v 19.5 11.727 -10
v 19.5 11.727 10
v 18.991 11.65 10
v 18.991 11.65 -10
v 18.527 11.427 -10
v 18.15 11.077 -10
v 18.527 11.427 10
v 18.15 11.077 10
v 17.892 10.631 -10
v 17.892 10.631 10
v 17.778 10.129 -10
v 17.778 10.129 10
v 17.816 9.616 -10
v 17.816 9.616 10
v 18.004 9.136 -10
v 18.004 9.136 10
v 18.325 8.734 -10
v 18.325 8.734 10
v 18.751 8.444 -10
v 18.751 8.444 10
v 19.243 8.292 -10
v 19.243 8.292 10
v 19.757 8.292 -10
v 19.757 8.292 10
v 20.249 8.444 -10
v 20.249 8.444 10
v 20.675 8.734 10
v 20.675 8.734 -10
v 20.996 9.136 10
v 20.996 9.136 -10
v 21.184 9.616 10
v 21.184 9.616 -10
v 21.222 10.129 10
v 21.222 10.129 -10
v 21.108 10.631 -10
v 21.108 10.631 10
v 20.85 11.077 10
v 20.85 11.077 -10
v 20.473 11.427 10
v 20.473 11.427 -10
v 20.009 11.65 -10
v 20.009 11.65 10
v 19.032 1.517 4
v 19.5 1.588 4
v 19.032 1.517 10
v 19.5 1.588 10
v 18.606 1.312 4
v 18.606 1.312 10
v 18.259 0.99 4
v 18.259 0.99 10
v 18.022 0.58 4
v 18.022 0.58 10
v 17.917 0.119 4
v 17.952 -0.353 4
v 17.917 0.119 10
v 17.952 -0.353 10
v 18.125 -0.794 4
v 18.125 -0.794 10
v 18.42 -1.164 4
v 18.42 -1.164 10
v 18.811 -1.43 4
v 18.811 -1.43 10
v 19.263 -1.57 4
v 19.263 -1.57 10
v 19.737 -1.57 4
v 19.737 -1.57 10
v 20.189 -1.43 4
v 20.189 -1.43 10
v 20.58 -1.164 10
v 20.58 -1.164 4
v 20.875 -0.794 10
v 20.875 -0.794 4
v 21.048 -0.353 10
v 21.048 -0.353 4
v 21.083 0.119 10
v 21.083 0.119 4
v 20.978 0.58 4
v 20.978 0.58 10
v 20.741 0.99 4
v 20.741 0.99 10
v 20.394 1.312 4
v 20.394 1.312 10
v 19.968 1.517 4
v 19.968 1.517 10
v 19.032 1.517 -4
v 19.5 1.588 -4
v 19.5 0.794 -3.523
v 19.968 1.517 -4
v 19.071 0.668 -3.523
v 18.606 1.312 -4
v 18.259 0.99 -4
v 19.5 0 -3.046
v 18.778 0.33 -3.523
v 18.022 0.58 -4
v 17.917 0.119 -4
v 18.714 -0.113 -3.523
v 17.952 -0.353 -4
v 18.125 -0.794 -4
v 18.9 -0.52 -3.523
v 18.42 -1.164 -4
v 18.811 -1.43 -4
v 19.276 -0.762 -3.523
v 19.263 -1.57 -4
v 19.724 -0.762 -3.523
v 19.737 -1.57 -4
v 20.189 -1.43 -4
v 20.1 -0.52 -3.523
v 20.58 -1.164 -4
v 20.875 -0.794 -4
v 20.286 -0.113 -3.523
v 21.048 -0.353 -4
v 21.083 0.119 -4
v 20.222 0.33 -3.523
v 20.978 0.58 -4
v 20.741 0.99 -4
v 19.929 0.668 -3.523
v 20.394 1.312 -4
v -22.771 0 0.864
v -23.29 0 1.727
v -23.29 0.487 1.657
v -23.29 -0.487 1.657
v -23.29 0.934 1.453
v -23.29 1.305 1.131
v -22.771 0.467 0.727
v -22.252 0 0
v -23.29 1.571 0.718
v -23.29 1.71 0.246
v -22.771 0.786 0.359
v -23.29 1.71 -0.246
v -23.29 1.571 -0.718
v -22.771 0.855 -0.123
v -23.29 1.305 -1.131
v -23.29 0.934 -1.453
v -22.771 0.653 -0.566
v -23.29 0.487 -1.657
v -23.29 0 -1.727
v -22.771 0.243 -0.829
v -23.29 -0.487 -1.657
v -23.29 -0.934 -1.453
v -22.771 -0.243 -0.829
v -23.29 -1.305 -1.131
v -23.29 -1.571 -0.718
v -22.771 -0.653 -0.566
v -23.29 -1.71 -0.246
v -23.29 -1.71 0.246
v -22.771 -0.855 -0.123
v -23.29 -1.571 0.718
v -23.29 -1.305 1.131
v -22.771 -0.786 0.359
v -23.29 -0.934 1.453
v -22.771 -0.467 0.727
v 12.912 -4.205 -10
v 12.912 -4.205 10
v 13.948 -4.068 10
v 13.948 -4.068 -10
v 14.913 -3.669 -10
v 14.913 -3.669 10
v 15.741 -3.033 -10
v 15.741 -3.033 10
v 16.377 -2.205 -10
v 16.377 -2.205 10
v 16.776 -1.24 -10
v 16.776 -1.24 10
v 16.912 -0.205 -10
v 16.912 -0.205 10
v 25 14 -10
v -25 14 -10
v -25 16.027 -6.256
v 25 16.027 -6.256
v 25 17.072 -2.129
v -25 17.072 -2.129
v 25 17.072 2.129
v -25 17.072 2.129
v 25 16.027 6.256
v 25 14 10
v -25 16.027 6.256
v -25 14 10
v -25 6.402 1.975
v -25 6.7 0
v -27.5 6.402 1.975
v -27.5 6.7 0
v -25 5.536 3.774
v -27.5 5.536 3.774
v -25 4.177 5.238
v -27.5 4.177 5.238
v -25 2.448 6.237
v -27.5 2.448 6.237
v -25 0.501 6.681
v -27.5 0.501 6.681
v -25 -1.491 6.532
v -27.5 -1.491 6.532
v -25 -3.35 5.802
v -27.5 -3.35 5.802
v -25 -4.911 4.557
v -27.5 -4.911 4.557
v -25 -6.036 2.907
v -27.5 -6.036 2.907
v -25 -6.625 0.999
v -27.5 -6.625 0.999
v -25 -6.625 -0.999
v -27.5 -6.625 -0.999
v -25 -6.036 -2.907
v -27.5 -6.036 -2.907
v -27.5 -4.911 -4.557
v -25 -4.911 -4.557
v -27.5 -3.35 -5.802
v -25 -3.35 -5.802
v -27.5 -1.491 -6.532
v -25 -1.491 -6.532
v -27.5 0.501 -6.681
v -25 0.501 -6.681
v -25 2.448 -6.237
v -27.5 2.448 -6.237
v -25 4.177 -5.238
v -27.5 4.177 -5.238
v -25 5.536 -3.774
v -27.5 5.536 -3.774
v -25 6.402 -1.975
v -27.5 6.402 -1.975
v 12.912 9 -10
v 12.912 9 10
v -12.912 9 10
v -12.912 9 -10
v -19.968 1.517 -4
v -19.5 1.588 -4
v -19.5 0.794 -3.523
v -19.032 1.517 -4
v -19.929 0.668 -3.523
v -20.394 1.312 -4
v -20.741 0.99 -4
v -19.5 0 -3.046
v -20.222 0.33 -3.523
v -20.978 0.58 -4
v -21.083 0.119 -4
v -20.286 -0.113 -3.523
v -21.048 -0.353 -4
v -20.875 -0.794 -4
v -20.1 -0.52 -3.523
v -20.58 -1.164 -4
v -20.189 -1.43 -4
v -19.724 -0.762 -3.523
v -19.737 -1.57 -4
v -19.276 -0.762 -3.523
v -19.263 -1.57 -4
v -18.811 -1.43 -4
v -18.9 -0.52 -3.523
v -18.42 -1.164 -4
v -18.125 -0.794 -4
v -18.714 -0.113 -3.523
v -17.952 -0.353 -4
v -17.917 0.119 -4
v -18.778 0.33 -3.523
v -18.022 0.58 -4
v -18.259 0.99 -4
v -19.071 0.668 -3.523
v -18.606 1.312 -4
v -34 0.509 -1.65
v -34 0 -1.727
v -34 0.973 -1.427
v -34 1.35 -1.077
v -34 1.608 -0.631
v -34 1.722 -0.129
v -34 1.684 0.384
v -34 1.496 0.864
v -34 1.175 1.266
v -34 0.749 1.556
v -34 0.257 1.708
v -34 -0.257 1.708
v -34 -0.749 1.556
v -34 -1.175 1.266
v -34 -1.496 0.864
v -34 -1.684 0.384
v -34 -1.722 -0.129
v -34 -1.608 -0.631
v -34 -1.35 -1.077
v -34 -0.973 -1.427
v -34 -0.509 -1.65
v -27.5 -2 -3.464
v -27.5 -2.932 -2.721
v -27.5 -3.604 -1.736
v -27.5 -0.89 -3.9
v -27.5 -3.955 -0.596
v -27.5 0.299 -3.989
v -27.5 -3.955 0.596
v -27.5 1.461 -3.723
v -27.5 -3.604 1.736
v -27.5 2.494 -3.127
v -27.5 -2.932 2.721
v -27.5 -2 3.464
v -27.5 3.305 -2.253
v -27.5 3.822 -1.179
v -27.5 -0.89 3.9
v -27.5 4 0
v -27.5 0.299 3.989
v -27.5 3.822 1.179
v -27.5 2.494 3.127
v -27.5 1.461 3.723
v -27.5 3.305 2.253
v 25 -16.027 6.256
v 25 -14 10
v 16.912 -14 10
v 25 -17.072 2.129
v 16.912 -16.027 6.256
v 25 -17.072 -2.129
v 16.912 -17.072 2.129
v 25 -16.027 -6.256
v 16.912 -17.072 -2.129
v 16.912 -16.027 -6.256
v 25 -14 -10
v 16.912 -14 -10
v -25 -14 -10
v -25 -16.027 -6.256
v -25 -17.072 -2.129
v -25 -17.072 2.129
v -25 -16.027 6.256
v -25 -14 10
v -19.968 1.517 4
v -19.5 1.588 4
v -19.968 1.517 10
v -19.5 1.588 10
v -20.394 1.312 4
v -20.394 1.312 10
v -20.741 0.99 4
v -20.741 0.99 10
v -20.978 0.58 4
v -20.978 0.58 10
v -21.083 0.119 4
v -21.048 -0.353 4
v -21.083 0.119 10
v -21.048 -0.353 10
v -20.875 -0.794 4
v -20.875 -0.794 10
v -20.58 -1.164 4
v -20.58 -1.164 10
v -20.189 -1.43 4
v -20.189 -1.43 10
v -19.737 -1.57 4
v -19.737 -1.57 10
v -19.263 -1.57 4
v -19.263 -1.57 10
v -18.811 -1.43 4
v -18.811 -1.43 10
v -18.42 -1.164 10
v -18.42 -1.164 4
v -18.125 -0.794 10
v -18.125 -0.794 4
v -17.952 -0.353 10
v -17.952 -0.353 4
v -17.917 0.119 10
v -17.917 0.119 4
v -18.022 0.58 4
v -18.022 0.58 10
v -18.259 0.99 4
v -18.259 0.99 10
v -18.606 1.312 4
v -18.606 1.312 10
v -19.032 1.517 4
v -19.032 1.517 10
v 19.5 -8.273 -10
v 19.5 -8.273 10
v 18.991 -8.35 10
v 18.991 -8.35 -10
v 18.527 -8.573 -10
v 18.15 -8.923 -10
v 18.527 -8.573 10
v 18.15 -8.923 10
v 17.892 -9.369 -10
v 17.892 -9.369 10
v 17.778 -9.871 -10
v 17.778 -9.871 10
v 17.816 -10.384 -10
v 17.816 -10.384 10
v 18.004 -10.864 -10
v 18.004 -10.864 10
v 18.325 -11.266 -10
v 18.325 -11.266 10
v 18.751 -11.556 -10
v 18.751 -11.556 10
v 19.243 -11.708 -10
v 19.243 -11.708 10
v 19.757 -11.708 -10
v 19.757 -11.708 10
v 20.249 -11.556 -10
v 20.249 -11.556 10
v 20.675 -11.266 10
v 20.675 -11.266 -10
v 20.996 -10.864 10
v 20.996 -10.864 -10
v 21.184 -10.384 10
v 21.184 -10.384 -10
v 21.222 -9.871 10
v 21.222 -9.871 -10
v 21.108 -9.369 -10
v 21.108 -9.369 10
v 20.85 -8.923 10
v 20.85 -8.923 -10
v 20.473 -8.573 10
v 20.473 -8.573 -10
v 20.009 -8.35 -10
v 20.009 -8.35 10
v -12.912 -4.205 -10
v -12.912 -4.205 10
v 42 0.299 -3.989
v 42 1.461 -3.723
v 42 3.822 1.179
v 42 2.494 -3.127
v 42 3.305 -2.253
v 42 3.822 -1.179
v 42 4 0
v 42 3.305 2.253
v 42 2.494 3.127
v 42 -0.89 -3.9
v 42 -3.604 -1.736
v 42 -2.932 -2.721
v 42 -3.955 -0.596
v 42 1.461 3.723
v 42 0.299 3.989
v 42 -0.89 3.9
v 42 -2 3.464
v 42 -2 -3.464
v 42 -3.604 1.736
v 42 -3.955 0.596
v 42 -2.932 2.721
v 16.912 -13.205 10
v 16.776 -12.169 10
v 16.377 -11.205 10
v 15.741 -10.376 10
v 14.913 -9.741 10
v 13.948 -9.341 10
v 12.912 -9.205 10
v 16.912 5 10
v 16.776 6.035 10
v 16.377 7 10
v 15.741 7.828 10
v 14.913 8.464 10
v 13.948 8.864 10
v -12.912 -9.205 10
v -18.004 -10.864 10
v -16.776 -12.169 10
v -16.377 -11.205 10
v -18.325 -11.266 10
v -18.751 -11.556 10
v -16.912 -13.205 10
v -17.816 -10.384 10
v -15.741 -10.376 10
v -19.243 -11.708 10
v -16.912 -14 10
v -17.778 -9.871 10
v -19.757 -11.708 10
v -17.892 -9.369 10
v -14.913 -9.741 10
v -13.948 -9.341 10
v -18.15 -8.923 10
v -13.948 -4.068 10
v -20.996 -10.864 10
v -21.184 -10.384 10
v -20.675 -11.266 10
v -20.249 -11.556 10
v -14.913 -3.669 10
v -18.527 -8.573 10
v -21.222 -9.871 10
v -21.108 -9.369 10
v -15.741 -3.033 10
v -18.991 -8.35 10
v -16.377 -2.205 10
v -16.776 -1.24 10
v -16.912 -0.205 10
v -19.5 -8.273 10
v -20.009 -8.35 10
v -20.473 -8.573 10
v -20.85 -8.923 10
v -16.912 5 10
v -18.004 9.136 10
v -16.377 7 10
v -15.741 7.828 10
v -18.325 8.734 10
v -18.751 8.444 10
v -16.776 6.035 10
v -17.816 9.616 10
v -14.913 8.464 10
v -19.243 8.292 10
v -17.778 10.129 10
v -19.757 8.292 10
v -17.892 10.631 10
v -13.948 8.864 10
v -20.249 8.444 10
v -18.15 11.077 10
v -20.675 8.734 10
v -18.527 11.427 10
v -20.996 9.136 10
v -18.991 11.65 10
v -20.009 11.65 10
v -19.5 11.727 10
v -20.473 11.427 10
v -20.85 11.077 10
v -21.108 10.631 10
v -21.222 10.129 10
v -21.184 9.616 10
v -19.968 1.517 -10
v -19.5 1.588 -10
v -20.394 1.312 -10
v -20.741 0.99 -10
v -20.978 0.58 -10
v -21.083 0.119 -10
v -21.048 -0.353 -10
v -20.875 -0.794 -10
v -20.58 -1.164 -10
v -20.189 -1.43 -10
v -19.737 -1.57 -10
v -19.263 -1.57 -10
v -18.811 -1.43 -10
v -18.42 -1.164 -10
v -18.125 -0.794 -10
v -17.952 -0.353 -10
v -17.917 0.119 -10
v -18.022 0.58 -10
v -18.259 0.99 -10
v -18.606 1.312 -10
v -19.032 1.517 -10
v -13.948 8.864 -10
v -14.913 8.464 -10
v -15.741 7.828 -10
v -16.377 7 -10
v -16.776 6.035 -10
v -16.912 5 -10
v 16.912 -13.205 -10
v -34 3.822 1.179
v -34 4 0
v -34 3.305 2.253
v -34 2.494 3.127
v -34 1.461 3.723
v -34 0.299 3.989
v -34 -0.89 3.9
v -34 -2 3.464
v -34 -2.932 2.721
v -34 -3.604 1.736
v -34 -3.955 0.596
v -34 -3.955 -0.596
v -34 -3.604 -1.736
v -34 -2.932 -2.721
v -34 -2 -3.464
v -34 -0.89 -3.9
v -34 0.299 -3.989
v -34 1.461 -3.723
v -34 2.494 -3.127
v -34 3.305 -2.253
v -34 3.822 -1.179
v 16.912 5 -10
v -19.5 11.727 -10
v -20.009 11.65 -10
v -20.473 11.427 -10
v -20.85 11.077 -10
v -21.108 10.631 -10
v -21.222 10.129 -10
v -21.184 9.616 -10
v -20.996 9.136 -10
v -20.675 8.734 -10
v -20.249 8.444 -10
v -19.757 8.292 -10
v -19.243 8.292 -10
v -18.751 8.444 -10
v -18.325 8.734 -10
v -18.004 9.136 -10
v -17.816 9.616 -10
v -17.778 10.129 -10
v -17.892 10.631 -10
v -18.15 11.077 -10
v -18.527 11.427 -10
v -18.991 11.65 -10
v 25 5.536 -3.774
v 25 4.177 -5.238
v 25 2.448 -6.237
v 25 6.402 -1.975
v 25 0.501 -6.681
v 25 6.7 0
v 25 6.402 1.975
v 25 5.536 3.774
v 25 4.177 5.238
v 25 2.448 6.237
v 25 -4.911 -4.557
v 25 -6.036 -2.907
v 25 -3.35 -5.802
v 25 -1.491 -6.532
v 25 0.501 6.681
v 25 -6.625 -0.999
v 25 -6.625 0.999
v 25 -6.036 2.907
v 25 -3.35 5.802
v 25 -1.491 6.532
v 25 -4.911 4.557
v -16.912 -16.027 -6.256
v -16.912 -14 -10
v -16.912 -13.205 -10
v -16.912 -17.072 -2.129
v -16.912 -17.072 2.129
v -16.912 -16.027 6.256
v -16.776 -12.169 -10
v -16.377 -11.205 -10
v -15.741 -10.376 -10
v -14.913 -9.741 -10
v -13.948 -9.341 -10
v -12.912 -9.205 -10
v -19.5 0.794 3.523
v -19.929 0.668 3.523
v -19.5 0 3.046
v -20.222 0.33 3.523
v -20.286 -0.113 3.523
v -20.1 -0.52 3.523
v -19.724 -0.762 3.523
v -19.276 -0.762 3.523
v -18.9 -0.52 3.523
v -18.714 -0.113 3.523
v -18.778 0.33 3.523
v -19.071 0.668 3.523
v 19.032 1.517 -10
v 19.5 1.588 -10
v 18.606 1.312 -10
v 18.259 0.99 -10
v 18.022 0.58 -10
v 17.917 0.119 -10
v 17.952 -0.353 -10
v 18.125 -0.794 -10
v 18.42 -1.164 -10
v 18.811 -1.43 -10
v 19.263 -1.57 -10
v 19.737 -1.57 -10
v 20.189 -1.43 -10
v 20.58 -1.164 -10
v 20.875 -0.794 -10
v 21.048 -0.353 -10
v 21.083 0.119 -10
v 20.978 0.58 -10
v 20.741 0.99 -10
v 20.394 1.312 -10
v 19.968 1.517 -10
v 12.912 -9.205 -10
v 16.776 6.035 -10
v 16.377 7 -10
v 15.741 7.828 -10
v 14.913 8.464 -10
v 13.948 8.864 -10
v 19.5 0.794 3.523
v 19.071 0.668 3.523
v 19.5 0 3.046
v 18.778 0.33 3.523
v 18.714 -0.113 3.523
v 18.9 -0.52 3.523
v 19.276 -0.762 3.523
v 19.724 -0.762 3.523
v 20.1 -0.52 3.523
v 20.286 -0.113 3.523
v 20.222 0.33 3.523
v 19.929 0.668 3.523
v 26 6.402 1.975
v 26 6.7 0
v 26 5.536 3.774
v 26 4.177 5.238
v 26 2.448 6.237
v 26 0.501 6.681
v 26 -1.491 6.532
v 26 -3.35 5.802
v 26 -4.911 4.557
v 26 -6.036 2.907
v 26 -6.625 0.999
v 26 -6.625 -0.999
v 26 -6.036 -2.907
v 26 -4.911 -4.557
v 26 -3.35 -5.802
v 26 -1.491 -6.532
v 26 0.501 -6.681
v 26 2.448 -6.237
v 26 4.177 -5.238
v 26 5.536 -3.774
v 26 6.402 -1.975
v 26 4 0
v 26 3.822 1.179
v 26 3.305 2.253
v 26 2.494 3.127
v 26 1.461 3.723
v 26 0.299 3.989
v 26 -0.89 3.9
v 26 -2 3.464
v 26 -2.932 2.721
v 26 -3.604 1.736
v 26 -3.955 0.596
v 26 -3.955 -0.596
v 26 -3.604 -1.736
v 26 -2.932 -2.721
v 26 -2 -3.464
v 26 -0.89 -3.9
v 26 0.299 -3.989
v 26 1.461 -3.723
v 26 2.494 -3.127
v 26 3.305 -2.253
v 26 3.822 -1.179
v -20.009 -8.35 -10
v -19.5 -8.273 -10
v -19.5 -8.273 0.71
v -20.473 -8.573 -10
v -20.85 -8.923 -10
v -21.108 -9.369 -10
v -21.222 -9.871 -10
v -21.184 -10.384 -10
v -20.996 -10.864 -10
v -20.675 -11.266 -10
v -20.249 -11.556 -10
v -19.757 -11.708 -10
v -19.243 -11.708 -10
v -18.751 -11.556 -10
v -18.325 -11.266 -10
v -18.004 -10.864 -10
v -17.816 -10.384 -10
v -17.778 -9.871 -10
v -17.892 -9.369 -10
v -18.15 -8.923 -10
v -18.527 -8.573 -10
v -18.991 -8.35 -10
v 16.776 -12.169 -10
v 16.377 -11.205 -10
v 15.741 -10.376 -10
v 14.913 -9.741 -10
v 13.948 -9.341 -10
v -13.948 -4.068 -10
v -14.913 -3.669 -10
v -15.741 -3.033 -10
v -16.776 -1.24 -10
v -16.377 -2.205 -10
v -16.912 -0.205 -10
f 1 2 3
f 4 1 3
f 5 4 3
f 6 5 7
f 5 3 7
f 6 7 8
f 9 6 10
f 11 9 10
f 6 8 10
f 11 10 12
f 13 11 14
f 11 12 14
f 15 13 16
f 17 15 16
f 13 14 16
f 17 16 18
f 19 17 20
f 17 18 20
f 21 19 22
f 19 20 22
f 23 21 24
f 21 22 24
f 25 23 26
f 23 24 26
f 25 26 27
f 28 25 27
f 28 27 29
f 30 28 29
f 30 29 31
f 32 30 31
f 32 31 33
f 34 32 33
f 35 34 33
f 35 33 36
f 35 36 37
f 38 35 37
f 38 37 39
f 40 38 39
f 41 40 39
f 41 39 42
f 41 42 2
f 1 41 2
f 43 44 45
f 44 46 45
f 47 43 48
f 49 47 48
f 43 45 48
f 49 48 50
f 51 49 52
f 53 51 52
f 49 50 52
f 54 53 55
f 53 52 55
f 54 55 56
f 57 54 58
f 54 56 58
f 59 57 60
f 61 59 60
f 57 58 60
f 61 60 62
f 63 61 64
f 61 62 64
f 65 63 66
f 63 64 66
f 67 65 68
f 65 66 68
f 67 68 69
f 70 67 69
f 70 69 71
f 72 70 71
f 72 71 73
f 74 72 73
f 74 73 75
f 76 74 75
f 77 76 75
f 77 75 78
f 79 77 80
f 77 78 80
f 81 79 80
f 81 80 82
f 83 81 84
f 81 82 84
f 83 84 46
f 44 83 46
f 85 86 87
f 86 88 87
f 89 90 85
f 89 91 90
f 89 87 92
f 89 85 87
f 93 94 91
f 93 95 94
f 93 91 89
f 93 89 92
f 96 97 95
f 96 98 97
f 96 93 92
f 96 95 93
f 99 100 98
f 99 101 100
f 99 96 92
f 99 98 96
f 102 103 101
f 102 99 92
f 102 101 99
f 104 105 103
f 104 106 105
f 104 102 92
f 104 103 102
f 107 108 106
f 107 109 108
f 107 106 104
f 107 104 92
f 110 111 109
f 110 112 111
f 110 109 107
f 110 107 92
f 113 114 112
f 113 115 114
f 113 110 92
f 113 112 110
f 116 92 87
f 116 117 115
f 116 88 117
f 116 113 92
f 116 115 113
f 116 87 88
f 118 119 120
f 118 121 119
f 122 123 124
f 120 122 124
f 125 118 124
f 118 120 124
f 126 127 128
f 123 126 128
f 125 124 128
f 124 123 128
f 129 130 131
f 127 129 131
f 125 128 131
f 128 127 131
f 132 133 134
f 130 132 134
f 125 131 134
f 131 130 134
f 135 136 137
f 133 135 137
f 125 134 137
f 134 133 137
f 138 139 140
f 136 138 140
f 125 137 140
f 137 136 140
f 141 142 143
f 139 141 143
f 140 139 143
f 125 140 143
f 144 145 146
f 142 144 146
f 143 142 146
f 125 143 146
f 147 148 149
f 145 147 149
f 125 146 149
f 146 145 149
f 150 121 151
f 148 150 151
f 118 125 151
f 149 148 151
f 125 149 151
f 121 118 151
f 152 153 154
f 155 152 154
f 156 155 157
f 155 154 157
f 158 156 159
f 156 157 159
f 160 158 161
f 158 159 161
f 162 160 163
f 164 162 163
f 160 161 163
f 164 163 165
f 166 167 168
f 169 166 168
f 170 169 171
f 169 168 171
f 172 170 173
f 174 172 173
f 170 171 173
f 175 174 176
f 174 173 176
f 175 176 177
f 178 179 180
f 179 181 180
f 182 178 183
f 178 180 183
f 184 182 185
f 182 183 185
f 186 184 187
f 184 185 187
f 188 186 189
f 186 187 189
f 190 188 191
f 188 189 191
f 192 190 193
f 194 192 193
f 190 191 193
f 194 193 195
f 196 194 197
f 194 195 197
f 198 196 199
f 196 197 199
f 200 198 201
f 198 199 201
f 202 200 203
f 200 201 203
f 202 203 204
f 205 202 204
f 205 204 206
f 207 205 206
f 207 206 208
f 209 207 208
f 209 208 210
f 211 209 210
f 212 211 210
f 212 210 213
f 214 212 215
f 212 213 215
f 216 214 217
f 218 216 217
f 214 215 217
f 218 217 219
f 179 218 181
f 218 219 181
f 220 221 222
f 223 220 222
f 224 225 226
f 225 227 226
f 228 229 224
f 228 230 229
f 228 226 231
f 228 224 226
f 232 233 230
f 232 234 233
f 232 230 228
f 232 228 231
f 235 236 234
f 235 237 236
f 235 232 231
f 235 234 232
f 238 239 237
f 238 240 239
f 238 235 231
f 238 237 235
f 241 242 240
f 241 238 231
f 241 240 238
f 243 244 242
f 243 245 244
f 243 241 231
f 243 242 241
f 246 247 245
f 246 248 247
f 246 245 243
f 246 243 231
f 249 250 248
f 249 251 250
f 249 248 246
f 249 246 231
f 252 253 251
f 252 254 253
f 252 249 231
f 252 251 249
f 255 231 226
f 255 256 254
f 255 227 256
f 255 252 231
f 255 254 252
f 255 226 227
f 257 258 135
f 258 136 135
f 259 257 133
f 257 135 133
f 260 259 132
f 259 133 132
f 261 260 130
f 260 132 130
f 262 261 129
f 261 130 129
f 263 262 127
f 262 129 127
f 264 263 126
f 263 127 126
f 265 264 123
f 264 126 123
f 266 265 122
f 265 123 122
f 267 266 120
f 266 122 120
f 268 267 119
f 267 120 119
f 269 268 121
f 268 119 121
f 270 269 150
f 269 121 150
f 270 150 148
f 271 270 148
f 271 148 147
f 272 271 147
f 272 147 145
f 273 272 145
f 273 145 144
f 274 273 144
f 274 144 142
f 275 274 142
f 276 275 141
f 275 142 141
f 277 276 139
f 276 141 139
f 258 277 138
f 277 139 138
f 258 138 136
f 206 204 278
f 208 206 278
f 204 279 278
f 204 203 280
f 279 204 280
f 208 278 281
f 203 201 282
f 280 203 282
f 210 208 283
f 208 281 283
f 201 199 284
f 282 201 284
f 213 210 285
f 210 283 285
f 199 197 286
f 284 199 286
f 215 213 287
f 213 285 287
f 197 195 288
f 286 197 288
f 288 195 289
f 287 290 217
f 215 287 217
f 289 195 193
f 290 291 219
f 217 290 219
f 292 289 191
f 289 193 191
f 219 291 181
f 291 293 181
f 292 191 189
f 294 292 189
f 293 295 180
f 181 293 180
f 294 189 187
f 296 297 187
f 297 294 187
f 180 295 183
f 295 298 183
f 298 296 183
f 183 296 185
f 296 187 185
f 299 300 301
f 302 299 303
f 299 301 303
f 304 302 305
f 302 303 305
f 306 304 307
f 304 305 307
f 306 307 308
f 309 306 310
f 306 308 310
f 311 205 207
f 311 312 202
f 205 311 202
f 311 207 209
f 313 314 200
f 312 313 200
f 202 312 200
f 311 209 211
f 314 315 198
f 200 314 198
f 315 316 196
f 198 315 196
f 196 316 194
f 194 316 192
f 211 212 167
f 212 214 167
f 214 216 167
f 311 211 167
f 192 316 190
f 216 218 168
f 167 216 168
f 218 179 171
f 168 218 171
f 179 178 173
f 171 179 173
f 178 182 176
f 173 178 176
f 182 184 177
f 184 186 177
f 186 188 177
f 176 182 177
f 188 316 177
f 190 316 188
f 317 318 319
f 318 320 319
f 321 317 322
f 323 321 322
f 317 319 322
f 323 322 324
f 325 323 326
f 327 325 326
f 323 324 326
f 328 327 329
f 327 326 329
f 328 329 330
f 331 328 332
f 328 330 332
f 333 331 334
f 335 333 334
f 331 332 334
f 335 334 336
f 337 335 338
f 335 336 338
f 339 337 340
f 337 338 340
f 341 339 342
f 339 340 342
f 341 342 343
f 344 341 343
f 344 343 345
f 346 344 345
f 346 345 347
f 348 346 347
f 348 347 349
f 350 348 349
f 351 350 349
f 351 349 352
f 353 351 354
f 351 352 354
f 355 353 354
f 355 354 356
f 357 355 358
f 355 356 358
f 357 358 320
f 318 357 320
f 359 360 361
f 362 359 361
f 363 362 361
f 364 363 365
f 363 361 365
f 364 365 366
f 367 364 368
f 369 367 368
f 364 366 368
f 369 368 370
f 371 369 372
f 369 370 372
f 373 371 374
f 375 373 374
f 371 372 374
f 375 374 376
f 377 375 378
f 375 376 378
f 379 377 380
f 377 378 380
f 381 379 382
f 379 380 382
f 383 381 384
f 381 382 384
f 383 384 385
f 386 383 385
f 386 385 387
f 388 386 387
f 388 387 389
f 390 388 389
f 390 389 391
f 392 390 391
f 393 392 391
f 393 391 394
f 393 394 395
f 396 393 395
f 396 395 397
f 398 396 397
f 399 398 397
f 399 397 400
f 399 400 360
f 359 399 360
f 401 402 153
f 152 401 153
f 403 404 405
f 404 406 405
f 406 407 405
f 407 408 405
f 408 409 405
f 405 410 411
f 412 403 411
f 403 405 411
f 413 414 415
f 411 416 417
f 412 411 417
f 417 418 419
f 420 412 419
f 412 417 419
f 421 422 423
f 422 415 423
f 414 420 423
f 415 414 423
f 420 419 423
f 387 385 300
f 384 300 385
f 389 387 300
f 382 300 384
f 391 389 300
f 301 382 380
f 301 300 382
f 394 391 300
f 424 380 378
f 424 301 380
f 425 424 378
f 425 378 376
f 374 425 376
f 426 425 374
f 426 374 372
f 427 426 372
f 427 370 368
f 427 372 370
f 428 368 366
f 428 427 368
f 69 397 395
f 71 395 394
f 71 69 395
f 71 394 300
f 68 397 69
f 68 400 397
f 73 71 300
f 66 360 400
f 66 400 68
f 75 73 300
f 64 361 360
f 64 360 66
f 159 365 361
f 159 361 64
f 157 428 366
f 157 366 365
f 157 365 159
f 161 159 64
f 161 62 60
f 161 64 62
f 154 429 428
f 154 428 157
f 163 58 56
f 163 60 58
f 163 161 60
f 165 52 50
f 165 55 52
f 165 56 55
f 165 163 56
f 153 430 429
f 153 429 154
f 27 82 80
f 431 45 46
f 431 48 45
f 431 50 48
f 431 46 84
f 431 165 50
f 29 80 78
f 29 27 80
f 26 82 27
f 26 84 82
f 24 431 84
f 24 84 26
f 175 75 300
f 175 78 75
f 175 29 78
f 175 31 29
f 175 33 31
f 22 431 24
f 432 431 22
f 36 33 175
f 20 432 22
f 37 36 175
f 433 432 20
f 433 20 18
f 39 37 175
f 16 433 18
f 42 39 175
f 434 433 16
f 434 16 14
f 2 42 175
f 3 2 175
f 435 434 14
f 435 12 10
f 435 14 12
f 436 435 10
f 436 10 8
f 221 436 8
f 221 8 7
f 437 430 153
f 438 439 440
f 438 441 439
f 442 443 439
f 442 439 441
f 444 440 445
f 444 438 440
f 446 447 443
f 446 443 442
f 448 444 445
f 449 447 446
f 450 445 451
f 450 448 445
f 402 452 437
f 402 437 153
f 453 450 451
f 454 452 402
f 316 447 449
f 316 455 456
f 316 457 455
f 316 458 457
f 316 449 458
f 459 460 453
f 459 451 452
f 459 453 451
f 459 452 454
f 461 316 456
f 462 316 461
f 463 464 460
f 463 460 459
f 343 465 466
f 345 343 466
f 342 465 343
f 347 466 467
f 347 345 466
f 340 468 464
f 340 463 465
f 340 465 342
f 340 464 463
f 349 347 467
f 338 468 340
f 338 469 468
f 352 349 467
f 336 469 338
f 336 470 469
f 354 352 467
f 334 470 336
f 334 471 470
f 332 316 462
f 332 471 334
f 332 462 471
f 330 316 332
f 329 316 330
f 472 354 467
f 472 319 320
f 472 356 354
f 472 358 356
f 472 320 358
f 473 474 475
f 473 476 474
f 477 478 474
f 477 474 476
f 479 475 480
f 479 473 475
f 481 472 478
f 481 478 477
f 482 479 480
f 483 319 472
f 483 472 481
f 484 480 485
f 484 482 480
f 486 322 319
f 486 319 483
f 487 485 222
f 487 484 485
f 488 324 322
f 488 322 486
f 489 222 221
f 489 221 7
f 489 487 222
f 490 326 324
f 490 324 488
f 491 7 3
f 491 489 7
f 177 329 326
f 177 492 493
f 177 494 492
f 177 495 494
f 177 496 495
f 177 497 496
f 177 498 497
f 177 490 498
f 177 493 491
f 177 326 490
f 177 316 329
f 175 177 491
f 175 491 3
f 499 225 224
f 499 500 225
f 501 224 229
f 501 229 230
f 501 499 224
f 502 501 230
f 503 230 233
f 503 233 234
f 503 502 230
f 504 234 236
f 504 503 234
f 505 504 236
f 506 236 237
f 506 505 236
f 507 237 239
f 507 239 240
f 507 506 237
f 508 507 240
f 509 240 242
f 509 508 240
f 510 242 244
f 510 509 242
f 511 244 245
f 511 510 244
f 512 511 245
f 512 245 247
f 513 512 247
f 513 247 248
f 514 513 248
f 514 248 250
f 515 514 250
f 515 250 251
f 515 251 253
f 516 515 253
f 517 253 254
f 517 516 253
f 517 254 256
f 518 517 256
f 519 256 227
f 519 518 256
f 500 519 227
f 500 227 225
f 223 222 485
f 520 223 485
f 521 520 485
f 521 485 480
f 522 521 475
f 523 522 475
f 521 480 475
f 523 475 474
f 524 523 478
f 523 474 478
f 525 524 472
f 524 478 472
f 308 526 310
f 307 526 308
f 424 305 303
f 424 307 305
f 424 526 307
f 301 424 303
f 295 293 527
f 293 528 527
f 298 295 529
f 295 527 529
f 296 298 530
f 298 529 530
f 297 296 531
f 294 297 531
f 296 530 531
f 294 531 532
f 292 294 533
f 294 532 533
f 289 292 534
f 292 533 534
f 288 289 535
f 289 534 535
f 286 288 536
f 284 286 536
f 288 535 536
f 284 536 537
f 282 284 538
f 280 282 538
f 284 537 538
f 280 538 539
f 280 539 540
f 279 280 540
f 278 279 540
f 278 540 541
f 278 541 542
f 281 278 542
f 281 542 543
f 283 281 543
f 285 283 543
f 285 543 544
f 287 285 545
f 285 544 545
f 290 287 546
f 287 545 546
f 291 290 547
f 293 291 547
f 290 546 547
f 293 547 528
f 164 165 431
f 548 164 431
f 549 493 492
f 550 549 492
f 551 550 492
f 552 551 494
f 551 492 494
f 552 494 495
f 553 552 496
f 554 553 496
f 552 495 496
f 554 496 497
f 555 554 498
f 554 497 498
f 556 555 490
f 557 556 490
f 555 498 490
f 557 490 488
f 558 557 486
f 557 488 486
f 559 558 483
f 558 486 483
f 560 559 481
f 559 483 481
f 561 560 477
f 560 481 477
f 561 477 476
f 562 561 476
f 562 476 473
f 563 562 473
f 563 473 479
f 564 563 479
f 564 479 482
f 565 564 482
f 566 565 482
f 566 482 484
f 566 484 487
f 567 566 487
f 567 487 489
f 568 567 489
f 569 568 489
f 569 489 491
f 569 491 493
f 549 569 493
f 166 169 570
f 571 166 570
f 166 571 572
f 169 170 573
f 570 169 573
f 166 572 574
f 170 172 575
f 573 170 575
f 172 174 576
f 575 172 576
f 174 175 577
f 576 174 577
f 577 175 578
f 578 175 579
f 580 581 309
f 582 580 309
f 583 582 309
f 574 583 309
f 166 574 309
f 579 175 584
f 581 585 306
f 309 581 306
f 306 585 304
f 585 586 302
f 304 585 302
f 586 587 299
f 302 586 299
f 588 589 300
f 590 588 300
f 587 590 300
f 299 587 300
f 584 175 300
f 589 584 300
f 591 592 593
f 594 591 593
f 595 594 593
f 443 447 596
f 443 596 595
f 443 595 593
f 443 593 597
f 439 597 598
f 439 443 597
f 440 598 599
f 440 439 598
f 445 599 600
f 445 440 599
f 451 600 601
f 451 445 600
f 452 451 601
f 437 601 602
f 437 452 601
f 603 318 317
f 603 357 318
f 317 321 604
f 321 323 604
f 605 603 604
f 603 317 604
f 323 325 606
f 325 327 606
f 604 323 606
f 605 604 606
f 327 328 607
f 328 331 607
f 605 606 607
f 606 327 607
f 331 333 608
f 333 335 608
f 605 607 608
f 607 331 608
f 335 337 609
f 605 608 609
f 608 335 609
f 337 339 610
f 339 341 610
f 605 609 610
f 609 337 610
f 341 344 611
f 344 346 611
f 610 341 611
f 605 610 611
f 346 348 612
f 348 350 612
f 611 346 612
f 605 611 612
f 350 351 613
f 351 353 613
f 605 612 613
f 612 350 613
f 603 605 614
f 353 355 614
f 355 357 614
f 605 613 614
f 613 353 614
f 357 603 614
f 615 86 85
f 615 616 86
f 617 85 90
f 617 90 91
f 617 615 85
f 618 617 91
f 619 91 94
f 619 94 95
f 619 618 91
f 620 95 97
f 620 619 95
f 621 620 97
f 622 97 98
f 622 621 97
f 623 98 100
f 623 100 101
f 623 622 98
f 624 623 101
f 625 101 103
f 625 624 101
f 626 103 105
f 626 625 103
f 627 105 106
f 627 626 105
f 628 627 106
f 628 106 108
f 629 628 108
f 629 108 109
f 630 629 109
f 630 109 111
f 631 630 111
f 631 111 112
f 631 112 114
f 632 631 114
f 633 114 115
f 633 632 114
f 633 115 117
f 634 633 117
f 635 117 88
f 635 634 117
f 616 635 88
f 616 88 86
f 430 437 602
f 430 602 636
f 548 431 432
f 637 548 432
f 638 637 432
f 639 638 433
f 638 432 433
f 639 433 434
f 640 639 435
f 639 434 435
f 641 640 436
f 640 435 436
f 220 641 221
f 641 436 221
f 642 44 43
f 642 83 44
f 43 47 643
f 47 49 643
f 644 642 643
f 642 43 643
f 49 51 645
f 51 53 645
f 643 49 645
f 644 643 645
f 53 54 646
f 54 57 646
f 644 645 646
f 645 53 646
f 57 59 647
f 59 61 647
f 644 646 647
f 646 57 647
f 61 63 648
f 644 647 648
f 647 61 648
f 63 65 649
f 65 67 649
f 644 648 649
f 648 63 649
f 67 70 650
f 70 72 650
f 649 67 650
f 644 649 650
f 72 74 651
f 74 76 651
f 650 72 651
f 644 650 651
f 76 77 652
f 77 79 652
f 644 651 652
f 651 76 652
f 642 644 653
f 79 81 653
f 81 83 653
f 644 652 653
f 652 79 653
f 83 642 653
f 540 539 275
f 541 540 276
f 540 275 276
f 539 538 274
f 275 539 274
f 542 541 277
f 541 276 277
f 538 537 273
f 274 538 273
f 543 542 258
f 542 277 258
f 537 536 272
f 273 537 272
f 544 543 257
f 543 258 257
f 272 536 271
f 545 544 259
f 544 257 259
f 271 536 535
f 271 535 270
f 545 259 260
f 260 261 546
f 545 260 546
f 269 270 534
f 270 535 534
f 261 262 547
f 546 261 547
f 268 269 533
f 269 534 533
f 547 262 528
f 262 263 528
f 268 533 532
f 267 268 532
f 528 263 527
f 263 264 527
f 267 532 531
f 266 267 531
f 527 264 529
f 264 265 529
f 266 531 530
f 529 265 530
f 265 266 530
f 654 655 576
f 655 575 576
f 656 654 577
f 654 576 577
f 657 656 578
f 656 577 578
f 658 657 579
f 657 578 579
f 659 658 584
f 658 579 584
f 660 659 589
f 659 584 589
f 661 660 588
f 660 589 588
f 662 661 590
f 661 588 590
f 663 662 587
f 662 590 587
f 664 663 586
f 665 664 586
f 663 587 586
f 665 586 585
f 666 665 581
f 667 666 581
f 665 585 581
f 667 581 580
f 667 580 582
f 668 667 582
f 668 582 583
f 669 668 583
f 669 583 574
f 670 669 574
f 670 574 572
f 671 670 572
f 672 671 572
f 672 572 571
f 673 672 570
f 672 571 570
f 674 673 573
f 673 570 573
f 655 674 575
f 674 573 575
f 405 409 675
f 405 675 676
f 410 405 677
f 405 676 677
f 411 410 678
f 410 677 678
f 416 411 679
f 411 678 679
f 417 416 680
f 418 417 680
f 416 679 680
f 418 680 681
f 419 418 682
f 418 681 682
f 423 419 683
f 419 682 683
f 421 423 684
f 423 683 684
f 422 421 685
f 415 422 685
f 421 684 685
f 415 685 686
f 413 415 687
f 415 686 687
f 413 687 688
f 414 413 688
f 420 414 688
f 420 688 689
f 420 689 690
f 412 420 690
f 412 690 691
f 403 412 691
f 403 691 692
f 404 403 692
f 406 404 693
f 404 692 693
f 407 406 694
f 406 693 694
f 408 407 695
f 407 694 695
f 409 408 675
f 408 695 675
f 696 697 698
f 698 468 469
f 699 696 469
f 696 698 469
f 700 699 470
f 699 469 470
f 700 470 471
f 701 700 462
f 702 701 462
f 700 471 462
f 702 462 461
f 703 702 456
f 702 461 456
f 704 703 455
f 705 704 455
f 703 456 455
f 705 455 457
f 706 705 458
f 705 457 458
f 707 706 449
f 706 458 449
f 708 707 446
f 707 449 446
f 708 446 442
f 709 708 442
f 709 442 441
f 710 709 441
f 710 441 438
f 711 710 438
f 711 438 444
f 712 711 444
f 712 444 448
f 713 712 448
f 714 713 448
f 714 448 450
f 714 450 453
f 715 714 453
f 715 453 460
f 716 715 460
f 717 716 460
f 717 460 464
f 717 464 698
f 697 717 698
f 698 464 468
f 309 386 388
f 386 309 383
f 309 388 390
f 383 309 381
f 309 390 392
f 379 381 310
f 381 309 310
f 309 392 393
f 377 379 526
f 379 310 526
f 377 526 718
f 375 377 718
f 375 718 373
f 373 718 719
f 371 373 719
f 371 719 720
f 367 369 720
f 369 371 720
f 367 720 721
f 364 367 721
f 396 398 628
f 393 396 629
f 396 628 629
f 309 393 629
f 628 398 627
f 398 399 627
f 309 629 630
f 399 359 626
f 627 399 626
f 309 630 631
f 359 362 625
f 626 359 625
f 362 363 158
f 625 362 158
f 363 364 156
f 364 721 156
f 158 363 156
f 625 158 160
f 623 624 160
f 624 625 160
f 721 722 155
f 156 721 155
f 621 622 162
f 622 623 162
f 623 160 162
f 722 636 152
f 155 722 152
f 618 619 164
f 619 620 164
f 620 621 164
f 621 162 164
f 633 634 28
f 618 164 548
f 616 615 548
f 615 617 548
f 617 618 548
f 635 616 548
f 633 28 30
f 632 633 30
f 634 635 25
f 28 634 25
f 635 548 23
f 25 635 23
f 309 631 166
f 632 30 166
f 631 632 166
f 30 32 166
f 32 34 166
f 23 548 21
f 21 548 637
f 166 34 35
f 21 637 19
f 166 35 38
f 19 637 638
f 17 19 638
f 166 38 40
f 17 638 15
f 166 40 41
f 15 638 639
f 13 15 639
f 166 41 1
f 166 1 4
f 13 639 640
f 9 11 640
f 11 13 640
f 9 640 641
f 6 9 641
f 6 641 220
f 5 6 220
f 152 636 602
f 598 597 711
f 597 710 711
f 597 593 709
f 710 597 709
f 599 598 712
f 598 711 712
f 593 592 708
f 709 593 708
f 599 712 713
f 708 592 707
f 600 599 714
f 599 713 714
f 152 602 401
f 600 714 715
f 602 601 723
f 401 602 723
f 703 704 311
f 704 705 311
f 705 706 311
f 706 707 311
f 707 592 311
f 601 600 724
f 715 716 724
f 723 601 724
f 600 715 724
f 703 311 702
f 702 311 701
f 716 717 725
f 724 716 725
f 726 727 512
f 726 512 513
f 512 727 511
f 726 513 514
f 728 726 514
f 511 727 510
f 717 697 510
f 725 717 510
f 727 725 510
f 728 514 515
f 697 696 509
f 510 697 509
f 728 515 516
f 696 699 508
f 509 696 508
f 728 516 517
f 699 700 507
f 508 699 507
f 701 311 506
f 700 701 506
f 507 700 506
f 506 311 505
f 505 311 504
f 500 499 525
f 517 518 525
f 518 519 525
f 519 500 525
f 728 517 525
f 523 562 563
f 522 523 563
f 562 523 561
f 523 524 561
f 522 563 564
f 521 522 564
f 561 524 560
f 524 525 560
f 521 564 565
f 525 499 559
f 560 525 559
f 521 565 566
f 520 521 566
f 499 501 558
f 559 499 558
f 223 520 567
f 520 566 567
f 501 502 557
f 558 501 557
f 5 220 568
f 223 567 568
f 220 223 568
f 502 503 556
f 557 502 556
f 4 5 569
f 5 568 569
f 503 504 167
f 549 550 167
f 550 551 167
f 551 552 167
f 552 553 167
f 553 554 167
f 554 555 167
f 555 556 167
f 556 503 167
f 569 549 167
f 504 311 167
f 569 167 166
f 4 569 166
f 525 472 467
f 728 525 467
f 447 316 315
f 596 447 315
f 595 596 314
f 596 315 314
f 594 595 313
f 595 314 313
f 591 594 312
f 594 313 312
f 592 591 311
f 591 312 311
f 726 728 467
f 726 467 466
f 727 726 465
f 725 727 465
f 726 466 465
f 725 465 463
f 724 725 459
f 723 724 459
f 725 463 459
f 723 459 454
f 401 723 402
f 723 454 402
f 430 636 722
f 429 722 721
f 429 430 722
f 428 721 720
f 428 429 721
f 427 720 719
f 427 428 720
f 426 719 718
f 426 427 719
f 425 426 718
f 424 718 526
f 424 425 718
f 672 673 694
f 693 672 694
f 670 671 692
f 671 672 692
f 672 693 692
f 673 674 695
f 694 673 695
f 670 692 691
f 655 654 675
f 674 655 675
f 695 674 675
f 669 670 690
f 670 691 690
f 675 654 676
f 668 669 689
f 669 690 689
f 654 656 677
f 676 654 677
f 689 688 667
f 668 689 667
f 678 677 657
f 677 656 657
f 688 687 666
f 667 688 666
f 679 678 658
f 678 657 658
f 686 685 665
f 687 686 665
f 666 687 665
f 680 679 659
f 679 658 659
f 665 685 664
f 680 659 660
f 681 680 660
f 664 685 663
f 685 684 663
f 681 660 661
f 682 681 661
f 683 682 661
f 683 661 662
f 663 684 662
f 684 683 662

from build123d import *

# Parameters (mm, degrees)
SKETCH3_OUTSIDE_W                   = 54.458
SKETCH3_OUTSIDE_H                   = 54.458
SKETCH3_OUTSIDE_W_2                 = 20
SKETCH3_OUTSIDE_H_2                 = 34.409301068
CUT_EXTRUDE1_DEPTH                  = 10
CUT_EXTRUDE1_DEPTH_BACK             = 68
F_8_32_TAPPED_HOLE1_AT_2_COUNT      = 2
F_8_32_TAPPED_HOLE1_AT_2_PITCH      = 43.829214002
F_8_32_TAPPED_HOLE1_AT_3_COUNT      = 2
F_8_32_TAPPED_HOLE1_AT_3_PITCH      = 20
F_8_32_TAPPED_HOLE1_AT_4_COUNT      = 2
F_8_32_TAPPED_HOLE1_AT_4_PITCH      = 39
F_1_8_0_1250_DOWEL_HOLE1_AT_2_COUNT = 2
F_1_8_0_1250_DOWEL_HOLE1_AT_2_PITCH = 39
F_8_32_TAPPED_HOLE2_D               = 3.4544
F_8_32_TAPPED_HOLE2_DEPTH           = 10.71
F_8_32_TAPPED_HOLE2_TIP             = 1.037806461
CUT_EXTRUDE3_DEPTH                  = 1
CUT_EXTRUDE3_DEPTH_BACK             = 21


with BuildPart() as part:
    # Sketch2 → Revolve1 (revolve)
    with BuildSketch(Plane.XY):
        Polygon((-34, 0), (42, 0), (42, 4), (26, 4), (26, 6.7), (25, 6.7), (25, 17.204650534), (-25, 17.204650534), (-25, 6.7), (-27.5, 6.7), (-27.5, 4), (-34, 4), align=None)
    revolve(axis=Axis((-34, 0, 0), (1, 0, 0)))

    # Sketch3 outside → Cut-Extrude1 (cut, two sides)
    with BuildSketch(Plane.ZY.offset(25)) as cut_extrude1_sk:
        Rectangle(SKETCH3_OUTSIDE_W, SKETCH3_OUTSIDE_H)
        Rectangle(SKETCH3_OUTSIDE_W_2, SKETCH3_OUTSIDE_H_2, mode=Mode.SUBTRACT)
    extrude(amount=CUT_EXTRUDE1_DEPTH, mode=Mode.SUBTRACT)
    extrude(cut_extrude1_sk.sketch, amount=-CUT_EXTRUDE1_DEPTH_BACK, mode=Mode.SUBTRACT)

    # Sketch5 → #8-32 Tapped Hole1 (revolve, cut)
    with BuildSketch(Plane(origin=(19.5, 10, -10), x_dir=(0, 1, 0), z_dir=(1, 0, 0))):
        Polygon((0, 0), (0, 11.747806461), (1.7272, 10.71), (1.7272, 0), align=None)
    f_8_32_tapped_hole1 = revolve(axis=Axis((19.5, 10, -16.35), (0, 0, 1)), mode=Mode.SUBTRACT)

    # #8-32 Tapped Hole1 at 2: #8-32 Tapped Hole1 ×2
    with Locations(*[Vector(-0.889817463, -0.456316648, 0) * (i * F_8_32_TAPPED_HOLE1_AT_2_PITCH) for i in range(1, F_8_32_TAPPED_HOLE1_AT_2_COUNT)]):
        add(f_8_32_tapped_hole1, mode=Mode.SUBTRACT)

    # #8-32 Tapped Hole1 at 3: #8-32 Tapped Hole1 ×2
    with Locations(*[(0, -i * F_8_32_TAPPED_HOLE1_AT_3_PITCH, 0) for i in range(1, F_8_32_TAPPED_HOLE1_AT_3_COUNT)]):
        add(f_8_32_tapped_hole1, mode=Mode.SUBTRACT)

    # #8-32 Tapped Hole1 at 4: #8-32 Tapped Hole1 ×2
    with Locations(*[(-i * F_8_32_TAPPED_HOLE1_AT_4_PITCH, 0, 0) for i in range(1, F_8_32_TAPPED_HOLE1_AT_4_COUNT)]):
        add(f_8_32_tapped_hole1, mode=Mode.SUBTRACT)

    # Sketch7 → 1/8 (0.1250) Dowel Hole1 (revolve, cut)
    with BuildSketch(Plane(origin=(19.5, 0, -10), x_dir=(0, 1, 0), z_dir=(1, 0, 0))):
        Polygon((0, 0), (0, 6.953866233), (1.5875, 6), (1.5875, 0), align=None)
    f_1_8_0_1250_dowel_hole1 = revolve(axis=Axis((19.5, 0, -16.35), (0, 0, 1)), mode=Mode.SUBTRACT)

    # 1/8 (0.1250) Dowel Hole1 at 2: 1/8 (0.1250) Dowel Hole1 ×2
    with Locations(*[(-i * F_1_8_0_1250_DOWEL_HOLE1_AT_2_PITCH, 0, 0) for i in range(1, F_1_8_0_1250_DOWEL_HOLE1_AT_2_COUNT)]):
        add(f_1_8_0_1250_dowel_hole1, mode=Mode.SUBTRACT)

    # Mirror1: 1/8 (0.1250) Dowel Hole1, #8-32 Tapped Hole1 across plane
    add(f_1_8_0_1250_dowel_hole1.mirror(Plane.XY), mode=Mode.SUBTRACT)
    add(f_8_32_tapped_hole1.mirror(Plane.XY), mode=Mode.SUBTRACT)

    # Mirror1 copy 1 sketch → Mirror1 copy 1 (revolve, cut)
    with BuildSketch(Plane(origin=(-19.5, 0, 10), x_dir=(0, 1, 0), z_dir=(1, 0, 0))):
        Polygon((0, 0), (0, -6.953866233), (1.5875, -6), (1.5875, 0), align=None)
    revolve(axis=Axis((-19.5, 0, 16.35), (0, 0, 1)), mode=Mode.SUBTRACT)

    # Mirror1 copy 2 sketch → Mirror1 copy 2 (revolve, cut)
    with BuildSketch(Plane(origin=(-19.5, -10, 10), x_dir=(0, 1, 0), z_dir=(1, 0, 0))):
        Polygon((0, 0), (0, -11.747806461), (1.7272, -10.71), (1.7272, 0), align=None)
    revolve(axis=Axis((-19.5, -10, 16.35), (0, 0, 1)), mode=Mode.SUBTRACT)

    # Mirror1 copy 3 sketch → Mirror1 copy 3 (revolve, cut)
    with BuildSketch(Plane(origin=(19.5, -10, 10), x_dir=(0, 1, 0), z_dir=(1, 0, 0))):
        Polygon((0, 0), (0, -11.747806461), (1.7272, -10.71), (1.7272, 0), align=None)
    revolve(axis=Axis((19.5, -10, 16.35), (0, 0, 1)), mode=Mode.SUBTRACT)

    # Mirror1 copy 4 sketch → Mirror1 copy 4 (revolve, cut)
    with BuildSketch(Plane(origin=(-19.5, 10, 10), x_dir=(0, 1, 0), z_dir=(1, 0, 0))):
        Polygon((0, 0), (0, -11.747806461), (1.7272, -10.71), (1.7272, 0), align=None)
    revolve(axis=Axis((-19.5, 10, 16.35), (0, 0, 1)), mode=Mode.SUBTRACT)

    # #8-32 Tapped Hole2
    with Locations(Plane.ZY.offset(34)):
        with Locations((0, 0)):
            Hole(F_8_32_TAPPED_HOLE2_D / 2, depth=F_8_32_TAPPED_HOLE2_DEPTH)
            with Locations((0, 0, -(F_8_32_TAPPED_HOLE2_DEPTH + F_8_32_TAPPED_HOLE2_TIP / 2))):  # 118° drill point
                Cone(0, F_8_32_TAPPED_HOLE2_D / 2, F_8_32_TAPPED_HOLE2_TIP, mode=Mode.SUBTRACT)

    # Sketch12 → Cut-Extrude3 (cut, two sides)
    with BuildSketch(Plane.XY.offset(10)) as cut_extrude3_sk:
        with BuildLine():
            Line((-12.9125, -4.204650534), (12.9125, -4.204650534))
            ThreePointArc((12.9125, -4.204650534), (15.740927125, -3.033077659), (16.9125, -0.204650534))
            Line((16.9125, -0.204650534), (16.9125, 5))
            ThreePointArc((16.9125, 5), (15.740927125, 7.828427125), (12.9125, 9))
            Line((12.9125, 9), (-12.9125, 9))
            ThreePointArc((-12.9125, 9), (-15.740927125, 7.828427125), (-16.9125, 5))
            Line((-16.9125, 5), (-16.9125, -0.204650534))
            ThreePointArc((-16.9125, -0.204650534), (-15.740927125, -3.033077659), (-12.9125, -4.204650534))
        make_face()
        with BuildLine():
            Line((-12.9125, -9.204650534), (12.9125, -9.204650534))
            ThreePointArc((12.9125, -9.204650534), (15.740927125, -10.376223409), (16.9125, -13.204650534))
            Line((16.9125, -13.204650534), (16.9125, -17.204650534))
            Line((16.9125, -17.204650534), (-16.9125, -17.204650534))
            Line((-16.9125, -17.204650534), (-16.9125, -13.204650534))
            ThreePointArc((-16.9125, -13.204650534), (-15.740927125, -10.376223409), (-12.9125, -9.204650534))
        make_face()
    extrude(amount=CUT_EXTRUDE3_DEPTH, mode=Mode.SUBTRACT)
    extrude(cut_extrude3_sk.sketch, amount=-CUT_EXTRUDE3_DEPTH_BACK, mode=Mode.SUBTRACT)


solid = part.part
